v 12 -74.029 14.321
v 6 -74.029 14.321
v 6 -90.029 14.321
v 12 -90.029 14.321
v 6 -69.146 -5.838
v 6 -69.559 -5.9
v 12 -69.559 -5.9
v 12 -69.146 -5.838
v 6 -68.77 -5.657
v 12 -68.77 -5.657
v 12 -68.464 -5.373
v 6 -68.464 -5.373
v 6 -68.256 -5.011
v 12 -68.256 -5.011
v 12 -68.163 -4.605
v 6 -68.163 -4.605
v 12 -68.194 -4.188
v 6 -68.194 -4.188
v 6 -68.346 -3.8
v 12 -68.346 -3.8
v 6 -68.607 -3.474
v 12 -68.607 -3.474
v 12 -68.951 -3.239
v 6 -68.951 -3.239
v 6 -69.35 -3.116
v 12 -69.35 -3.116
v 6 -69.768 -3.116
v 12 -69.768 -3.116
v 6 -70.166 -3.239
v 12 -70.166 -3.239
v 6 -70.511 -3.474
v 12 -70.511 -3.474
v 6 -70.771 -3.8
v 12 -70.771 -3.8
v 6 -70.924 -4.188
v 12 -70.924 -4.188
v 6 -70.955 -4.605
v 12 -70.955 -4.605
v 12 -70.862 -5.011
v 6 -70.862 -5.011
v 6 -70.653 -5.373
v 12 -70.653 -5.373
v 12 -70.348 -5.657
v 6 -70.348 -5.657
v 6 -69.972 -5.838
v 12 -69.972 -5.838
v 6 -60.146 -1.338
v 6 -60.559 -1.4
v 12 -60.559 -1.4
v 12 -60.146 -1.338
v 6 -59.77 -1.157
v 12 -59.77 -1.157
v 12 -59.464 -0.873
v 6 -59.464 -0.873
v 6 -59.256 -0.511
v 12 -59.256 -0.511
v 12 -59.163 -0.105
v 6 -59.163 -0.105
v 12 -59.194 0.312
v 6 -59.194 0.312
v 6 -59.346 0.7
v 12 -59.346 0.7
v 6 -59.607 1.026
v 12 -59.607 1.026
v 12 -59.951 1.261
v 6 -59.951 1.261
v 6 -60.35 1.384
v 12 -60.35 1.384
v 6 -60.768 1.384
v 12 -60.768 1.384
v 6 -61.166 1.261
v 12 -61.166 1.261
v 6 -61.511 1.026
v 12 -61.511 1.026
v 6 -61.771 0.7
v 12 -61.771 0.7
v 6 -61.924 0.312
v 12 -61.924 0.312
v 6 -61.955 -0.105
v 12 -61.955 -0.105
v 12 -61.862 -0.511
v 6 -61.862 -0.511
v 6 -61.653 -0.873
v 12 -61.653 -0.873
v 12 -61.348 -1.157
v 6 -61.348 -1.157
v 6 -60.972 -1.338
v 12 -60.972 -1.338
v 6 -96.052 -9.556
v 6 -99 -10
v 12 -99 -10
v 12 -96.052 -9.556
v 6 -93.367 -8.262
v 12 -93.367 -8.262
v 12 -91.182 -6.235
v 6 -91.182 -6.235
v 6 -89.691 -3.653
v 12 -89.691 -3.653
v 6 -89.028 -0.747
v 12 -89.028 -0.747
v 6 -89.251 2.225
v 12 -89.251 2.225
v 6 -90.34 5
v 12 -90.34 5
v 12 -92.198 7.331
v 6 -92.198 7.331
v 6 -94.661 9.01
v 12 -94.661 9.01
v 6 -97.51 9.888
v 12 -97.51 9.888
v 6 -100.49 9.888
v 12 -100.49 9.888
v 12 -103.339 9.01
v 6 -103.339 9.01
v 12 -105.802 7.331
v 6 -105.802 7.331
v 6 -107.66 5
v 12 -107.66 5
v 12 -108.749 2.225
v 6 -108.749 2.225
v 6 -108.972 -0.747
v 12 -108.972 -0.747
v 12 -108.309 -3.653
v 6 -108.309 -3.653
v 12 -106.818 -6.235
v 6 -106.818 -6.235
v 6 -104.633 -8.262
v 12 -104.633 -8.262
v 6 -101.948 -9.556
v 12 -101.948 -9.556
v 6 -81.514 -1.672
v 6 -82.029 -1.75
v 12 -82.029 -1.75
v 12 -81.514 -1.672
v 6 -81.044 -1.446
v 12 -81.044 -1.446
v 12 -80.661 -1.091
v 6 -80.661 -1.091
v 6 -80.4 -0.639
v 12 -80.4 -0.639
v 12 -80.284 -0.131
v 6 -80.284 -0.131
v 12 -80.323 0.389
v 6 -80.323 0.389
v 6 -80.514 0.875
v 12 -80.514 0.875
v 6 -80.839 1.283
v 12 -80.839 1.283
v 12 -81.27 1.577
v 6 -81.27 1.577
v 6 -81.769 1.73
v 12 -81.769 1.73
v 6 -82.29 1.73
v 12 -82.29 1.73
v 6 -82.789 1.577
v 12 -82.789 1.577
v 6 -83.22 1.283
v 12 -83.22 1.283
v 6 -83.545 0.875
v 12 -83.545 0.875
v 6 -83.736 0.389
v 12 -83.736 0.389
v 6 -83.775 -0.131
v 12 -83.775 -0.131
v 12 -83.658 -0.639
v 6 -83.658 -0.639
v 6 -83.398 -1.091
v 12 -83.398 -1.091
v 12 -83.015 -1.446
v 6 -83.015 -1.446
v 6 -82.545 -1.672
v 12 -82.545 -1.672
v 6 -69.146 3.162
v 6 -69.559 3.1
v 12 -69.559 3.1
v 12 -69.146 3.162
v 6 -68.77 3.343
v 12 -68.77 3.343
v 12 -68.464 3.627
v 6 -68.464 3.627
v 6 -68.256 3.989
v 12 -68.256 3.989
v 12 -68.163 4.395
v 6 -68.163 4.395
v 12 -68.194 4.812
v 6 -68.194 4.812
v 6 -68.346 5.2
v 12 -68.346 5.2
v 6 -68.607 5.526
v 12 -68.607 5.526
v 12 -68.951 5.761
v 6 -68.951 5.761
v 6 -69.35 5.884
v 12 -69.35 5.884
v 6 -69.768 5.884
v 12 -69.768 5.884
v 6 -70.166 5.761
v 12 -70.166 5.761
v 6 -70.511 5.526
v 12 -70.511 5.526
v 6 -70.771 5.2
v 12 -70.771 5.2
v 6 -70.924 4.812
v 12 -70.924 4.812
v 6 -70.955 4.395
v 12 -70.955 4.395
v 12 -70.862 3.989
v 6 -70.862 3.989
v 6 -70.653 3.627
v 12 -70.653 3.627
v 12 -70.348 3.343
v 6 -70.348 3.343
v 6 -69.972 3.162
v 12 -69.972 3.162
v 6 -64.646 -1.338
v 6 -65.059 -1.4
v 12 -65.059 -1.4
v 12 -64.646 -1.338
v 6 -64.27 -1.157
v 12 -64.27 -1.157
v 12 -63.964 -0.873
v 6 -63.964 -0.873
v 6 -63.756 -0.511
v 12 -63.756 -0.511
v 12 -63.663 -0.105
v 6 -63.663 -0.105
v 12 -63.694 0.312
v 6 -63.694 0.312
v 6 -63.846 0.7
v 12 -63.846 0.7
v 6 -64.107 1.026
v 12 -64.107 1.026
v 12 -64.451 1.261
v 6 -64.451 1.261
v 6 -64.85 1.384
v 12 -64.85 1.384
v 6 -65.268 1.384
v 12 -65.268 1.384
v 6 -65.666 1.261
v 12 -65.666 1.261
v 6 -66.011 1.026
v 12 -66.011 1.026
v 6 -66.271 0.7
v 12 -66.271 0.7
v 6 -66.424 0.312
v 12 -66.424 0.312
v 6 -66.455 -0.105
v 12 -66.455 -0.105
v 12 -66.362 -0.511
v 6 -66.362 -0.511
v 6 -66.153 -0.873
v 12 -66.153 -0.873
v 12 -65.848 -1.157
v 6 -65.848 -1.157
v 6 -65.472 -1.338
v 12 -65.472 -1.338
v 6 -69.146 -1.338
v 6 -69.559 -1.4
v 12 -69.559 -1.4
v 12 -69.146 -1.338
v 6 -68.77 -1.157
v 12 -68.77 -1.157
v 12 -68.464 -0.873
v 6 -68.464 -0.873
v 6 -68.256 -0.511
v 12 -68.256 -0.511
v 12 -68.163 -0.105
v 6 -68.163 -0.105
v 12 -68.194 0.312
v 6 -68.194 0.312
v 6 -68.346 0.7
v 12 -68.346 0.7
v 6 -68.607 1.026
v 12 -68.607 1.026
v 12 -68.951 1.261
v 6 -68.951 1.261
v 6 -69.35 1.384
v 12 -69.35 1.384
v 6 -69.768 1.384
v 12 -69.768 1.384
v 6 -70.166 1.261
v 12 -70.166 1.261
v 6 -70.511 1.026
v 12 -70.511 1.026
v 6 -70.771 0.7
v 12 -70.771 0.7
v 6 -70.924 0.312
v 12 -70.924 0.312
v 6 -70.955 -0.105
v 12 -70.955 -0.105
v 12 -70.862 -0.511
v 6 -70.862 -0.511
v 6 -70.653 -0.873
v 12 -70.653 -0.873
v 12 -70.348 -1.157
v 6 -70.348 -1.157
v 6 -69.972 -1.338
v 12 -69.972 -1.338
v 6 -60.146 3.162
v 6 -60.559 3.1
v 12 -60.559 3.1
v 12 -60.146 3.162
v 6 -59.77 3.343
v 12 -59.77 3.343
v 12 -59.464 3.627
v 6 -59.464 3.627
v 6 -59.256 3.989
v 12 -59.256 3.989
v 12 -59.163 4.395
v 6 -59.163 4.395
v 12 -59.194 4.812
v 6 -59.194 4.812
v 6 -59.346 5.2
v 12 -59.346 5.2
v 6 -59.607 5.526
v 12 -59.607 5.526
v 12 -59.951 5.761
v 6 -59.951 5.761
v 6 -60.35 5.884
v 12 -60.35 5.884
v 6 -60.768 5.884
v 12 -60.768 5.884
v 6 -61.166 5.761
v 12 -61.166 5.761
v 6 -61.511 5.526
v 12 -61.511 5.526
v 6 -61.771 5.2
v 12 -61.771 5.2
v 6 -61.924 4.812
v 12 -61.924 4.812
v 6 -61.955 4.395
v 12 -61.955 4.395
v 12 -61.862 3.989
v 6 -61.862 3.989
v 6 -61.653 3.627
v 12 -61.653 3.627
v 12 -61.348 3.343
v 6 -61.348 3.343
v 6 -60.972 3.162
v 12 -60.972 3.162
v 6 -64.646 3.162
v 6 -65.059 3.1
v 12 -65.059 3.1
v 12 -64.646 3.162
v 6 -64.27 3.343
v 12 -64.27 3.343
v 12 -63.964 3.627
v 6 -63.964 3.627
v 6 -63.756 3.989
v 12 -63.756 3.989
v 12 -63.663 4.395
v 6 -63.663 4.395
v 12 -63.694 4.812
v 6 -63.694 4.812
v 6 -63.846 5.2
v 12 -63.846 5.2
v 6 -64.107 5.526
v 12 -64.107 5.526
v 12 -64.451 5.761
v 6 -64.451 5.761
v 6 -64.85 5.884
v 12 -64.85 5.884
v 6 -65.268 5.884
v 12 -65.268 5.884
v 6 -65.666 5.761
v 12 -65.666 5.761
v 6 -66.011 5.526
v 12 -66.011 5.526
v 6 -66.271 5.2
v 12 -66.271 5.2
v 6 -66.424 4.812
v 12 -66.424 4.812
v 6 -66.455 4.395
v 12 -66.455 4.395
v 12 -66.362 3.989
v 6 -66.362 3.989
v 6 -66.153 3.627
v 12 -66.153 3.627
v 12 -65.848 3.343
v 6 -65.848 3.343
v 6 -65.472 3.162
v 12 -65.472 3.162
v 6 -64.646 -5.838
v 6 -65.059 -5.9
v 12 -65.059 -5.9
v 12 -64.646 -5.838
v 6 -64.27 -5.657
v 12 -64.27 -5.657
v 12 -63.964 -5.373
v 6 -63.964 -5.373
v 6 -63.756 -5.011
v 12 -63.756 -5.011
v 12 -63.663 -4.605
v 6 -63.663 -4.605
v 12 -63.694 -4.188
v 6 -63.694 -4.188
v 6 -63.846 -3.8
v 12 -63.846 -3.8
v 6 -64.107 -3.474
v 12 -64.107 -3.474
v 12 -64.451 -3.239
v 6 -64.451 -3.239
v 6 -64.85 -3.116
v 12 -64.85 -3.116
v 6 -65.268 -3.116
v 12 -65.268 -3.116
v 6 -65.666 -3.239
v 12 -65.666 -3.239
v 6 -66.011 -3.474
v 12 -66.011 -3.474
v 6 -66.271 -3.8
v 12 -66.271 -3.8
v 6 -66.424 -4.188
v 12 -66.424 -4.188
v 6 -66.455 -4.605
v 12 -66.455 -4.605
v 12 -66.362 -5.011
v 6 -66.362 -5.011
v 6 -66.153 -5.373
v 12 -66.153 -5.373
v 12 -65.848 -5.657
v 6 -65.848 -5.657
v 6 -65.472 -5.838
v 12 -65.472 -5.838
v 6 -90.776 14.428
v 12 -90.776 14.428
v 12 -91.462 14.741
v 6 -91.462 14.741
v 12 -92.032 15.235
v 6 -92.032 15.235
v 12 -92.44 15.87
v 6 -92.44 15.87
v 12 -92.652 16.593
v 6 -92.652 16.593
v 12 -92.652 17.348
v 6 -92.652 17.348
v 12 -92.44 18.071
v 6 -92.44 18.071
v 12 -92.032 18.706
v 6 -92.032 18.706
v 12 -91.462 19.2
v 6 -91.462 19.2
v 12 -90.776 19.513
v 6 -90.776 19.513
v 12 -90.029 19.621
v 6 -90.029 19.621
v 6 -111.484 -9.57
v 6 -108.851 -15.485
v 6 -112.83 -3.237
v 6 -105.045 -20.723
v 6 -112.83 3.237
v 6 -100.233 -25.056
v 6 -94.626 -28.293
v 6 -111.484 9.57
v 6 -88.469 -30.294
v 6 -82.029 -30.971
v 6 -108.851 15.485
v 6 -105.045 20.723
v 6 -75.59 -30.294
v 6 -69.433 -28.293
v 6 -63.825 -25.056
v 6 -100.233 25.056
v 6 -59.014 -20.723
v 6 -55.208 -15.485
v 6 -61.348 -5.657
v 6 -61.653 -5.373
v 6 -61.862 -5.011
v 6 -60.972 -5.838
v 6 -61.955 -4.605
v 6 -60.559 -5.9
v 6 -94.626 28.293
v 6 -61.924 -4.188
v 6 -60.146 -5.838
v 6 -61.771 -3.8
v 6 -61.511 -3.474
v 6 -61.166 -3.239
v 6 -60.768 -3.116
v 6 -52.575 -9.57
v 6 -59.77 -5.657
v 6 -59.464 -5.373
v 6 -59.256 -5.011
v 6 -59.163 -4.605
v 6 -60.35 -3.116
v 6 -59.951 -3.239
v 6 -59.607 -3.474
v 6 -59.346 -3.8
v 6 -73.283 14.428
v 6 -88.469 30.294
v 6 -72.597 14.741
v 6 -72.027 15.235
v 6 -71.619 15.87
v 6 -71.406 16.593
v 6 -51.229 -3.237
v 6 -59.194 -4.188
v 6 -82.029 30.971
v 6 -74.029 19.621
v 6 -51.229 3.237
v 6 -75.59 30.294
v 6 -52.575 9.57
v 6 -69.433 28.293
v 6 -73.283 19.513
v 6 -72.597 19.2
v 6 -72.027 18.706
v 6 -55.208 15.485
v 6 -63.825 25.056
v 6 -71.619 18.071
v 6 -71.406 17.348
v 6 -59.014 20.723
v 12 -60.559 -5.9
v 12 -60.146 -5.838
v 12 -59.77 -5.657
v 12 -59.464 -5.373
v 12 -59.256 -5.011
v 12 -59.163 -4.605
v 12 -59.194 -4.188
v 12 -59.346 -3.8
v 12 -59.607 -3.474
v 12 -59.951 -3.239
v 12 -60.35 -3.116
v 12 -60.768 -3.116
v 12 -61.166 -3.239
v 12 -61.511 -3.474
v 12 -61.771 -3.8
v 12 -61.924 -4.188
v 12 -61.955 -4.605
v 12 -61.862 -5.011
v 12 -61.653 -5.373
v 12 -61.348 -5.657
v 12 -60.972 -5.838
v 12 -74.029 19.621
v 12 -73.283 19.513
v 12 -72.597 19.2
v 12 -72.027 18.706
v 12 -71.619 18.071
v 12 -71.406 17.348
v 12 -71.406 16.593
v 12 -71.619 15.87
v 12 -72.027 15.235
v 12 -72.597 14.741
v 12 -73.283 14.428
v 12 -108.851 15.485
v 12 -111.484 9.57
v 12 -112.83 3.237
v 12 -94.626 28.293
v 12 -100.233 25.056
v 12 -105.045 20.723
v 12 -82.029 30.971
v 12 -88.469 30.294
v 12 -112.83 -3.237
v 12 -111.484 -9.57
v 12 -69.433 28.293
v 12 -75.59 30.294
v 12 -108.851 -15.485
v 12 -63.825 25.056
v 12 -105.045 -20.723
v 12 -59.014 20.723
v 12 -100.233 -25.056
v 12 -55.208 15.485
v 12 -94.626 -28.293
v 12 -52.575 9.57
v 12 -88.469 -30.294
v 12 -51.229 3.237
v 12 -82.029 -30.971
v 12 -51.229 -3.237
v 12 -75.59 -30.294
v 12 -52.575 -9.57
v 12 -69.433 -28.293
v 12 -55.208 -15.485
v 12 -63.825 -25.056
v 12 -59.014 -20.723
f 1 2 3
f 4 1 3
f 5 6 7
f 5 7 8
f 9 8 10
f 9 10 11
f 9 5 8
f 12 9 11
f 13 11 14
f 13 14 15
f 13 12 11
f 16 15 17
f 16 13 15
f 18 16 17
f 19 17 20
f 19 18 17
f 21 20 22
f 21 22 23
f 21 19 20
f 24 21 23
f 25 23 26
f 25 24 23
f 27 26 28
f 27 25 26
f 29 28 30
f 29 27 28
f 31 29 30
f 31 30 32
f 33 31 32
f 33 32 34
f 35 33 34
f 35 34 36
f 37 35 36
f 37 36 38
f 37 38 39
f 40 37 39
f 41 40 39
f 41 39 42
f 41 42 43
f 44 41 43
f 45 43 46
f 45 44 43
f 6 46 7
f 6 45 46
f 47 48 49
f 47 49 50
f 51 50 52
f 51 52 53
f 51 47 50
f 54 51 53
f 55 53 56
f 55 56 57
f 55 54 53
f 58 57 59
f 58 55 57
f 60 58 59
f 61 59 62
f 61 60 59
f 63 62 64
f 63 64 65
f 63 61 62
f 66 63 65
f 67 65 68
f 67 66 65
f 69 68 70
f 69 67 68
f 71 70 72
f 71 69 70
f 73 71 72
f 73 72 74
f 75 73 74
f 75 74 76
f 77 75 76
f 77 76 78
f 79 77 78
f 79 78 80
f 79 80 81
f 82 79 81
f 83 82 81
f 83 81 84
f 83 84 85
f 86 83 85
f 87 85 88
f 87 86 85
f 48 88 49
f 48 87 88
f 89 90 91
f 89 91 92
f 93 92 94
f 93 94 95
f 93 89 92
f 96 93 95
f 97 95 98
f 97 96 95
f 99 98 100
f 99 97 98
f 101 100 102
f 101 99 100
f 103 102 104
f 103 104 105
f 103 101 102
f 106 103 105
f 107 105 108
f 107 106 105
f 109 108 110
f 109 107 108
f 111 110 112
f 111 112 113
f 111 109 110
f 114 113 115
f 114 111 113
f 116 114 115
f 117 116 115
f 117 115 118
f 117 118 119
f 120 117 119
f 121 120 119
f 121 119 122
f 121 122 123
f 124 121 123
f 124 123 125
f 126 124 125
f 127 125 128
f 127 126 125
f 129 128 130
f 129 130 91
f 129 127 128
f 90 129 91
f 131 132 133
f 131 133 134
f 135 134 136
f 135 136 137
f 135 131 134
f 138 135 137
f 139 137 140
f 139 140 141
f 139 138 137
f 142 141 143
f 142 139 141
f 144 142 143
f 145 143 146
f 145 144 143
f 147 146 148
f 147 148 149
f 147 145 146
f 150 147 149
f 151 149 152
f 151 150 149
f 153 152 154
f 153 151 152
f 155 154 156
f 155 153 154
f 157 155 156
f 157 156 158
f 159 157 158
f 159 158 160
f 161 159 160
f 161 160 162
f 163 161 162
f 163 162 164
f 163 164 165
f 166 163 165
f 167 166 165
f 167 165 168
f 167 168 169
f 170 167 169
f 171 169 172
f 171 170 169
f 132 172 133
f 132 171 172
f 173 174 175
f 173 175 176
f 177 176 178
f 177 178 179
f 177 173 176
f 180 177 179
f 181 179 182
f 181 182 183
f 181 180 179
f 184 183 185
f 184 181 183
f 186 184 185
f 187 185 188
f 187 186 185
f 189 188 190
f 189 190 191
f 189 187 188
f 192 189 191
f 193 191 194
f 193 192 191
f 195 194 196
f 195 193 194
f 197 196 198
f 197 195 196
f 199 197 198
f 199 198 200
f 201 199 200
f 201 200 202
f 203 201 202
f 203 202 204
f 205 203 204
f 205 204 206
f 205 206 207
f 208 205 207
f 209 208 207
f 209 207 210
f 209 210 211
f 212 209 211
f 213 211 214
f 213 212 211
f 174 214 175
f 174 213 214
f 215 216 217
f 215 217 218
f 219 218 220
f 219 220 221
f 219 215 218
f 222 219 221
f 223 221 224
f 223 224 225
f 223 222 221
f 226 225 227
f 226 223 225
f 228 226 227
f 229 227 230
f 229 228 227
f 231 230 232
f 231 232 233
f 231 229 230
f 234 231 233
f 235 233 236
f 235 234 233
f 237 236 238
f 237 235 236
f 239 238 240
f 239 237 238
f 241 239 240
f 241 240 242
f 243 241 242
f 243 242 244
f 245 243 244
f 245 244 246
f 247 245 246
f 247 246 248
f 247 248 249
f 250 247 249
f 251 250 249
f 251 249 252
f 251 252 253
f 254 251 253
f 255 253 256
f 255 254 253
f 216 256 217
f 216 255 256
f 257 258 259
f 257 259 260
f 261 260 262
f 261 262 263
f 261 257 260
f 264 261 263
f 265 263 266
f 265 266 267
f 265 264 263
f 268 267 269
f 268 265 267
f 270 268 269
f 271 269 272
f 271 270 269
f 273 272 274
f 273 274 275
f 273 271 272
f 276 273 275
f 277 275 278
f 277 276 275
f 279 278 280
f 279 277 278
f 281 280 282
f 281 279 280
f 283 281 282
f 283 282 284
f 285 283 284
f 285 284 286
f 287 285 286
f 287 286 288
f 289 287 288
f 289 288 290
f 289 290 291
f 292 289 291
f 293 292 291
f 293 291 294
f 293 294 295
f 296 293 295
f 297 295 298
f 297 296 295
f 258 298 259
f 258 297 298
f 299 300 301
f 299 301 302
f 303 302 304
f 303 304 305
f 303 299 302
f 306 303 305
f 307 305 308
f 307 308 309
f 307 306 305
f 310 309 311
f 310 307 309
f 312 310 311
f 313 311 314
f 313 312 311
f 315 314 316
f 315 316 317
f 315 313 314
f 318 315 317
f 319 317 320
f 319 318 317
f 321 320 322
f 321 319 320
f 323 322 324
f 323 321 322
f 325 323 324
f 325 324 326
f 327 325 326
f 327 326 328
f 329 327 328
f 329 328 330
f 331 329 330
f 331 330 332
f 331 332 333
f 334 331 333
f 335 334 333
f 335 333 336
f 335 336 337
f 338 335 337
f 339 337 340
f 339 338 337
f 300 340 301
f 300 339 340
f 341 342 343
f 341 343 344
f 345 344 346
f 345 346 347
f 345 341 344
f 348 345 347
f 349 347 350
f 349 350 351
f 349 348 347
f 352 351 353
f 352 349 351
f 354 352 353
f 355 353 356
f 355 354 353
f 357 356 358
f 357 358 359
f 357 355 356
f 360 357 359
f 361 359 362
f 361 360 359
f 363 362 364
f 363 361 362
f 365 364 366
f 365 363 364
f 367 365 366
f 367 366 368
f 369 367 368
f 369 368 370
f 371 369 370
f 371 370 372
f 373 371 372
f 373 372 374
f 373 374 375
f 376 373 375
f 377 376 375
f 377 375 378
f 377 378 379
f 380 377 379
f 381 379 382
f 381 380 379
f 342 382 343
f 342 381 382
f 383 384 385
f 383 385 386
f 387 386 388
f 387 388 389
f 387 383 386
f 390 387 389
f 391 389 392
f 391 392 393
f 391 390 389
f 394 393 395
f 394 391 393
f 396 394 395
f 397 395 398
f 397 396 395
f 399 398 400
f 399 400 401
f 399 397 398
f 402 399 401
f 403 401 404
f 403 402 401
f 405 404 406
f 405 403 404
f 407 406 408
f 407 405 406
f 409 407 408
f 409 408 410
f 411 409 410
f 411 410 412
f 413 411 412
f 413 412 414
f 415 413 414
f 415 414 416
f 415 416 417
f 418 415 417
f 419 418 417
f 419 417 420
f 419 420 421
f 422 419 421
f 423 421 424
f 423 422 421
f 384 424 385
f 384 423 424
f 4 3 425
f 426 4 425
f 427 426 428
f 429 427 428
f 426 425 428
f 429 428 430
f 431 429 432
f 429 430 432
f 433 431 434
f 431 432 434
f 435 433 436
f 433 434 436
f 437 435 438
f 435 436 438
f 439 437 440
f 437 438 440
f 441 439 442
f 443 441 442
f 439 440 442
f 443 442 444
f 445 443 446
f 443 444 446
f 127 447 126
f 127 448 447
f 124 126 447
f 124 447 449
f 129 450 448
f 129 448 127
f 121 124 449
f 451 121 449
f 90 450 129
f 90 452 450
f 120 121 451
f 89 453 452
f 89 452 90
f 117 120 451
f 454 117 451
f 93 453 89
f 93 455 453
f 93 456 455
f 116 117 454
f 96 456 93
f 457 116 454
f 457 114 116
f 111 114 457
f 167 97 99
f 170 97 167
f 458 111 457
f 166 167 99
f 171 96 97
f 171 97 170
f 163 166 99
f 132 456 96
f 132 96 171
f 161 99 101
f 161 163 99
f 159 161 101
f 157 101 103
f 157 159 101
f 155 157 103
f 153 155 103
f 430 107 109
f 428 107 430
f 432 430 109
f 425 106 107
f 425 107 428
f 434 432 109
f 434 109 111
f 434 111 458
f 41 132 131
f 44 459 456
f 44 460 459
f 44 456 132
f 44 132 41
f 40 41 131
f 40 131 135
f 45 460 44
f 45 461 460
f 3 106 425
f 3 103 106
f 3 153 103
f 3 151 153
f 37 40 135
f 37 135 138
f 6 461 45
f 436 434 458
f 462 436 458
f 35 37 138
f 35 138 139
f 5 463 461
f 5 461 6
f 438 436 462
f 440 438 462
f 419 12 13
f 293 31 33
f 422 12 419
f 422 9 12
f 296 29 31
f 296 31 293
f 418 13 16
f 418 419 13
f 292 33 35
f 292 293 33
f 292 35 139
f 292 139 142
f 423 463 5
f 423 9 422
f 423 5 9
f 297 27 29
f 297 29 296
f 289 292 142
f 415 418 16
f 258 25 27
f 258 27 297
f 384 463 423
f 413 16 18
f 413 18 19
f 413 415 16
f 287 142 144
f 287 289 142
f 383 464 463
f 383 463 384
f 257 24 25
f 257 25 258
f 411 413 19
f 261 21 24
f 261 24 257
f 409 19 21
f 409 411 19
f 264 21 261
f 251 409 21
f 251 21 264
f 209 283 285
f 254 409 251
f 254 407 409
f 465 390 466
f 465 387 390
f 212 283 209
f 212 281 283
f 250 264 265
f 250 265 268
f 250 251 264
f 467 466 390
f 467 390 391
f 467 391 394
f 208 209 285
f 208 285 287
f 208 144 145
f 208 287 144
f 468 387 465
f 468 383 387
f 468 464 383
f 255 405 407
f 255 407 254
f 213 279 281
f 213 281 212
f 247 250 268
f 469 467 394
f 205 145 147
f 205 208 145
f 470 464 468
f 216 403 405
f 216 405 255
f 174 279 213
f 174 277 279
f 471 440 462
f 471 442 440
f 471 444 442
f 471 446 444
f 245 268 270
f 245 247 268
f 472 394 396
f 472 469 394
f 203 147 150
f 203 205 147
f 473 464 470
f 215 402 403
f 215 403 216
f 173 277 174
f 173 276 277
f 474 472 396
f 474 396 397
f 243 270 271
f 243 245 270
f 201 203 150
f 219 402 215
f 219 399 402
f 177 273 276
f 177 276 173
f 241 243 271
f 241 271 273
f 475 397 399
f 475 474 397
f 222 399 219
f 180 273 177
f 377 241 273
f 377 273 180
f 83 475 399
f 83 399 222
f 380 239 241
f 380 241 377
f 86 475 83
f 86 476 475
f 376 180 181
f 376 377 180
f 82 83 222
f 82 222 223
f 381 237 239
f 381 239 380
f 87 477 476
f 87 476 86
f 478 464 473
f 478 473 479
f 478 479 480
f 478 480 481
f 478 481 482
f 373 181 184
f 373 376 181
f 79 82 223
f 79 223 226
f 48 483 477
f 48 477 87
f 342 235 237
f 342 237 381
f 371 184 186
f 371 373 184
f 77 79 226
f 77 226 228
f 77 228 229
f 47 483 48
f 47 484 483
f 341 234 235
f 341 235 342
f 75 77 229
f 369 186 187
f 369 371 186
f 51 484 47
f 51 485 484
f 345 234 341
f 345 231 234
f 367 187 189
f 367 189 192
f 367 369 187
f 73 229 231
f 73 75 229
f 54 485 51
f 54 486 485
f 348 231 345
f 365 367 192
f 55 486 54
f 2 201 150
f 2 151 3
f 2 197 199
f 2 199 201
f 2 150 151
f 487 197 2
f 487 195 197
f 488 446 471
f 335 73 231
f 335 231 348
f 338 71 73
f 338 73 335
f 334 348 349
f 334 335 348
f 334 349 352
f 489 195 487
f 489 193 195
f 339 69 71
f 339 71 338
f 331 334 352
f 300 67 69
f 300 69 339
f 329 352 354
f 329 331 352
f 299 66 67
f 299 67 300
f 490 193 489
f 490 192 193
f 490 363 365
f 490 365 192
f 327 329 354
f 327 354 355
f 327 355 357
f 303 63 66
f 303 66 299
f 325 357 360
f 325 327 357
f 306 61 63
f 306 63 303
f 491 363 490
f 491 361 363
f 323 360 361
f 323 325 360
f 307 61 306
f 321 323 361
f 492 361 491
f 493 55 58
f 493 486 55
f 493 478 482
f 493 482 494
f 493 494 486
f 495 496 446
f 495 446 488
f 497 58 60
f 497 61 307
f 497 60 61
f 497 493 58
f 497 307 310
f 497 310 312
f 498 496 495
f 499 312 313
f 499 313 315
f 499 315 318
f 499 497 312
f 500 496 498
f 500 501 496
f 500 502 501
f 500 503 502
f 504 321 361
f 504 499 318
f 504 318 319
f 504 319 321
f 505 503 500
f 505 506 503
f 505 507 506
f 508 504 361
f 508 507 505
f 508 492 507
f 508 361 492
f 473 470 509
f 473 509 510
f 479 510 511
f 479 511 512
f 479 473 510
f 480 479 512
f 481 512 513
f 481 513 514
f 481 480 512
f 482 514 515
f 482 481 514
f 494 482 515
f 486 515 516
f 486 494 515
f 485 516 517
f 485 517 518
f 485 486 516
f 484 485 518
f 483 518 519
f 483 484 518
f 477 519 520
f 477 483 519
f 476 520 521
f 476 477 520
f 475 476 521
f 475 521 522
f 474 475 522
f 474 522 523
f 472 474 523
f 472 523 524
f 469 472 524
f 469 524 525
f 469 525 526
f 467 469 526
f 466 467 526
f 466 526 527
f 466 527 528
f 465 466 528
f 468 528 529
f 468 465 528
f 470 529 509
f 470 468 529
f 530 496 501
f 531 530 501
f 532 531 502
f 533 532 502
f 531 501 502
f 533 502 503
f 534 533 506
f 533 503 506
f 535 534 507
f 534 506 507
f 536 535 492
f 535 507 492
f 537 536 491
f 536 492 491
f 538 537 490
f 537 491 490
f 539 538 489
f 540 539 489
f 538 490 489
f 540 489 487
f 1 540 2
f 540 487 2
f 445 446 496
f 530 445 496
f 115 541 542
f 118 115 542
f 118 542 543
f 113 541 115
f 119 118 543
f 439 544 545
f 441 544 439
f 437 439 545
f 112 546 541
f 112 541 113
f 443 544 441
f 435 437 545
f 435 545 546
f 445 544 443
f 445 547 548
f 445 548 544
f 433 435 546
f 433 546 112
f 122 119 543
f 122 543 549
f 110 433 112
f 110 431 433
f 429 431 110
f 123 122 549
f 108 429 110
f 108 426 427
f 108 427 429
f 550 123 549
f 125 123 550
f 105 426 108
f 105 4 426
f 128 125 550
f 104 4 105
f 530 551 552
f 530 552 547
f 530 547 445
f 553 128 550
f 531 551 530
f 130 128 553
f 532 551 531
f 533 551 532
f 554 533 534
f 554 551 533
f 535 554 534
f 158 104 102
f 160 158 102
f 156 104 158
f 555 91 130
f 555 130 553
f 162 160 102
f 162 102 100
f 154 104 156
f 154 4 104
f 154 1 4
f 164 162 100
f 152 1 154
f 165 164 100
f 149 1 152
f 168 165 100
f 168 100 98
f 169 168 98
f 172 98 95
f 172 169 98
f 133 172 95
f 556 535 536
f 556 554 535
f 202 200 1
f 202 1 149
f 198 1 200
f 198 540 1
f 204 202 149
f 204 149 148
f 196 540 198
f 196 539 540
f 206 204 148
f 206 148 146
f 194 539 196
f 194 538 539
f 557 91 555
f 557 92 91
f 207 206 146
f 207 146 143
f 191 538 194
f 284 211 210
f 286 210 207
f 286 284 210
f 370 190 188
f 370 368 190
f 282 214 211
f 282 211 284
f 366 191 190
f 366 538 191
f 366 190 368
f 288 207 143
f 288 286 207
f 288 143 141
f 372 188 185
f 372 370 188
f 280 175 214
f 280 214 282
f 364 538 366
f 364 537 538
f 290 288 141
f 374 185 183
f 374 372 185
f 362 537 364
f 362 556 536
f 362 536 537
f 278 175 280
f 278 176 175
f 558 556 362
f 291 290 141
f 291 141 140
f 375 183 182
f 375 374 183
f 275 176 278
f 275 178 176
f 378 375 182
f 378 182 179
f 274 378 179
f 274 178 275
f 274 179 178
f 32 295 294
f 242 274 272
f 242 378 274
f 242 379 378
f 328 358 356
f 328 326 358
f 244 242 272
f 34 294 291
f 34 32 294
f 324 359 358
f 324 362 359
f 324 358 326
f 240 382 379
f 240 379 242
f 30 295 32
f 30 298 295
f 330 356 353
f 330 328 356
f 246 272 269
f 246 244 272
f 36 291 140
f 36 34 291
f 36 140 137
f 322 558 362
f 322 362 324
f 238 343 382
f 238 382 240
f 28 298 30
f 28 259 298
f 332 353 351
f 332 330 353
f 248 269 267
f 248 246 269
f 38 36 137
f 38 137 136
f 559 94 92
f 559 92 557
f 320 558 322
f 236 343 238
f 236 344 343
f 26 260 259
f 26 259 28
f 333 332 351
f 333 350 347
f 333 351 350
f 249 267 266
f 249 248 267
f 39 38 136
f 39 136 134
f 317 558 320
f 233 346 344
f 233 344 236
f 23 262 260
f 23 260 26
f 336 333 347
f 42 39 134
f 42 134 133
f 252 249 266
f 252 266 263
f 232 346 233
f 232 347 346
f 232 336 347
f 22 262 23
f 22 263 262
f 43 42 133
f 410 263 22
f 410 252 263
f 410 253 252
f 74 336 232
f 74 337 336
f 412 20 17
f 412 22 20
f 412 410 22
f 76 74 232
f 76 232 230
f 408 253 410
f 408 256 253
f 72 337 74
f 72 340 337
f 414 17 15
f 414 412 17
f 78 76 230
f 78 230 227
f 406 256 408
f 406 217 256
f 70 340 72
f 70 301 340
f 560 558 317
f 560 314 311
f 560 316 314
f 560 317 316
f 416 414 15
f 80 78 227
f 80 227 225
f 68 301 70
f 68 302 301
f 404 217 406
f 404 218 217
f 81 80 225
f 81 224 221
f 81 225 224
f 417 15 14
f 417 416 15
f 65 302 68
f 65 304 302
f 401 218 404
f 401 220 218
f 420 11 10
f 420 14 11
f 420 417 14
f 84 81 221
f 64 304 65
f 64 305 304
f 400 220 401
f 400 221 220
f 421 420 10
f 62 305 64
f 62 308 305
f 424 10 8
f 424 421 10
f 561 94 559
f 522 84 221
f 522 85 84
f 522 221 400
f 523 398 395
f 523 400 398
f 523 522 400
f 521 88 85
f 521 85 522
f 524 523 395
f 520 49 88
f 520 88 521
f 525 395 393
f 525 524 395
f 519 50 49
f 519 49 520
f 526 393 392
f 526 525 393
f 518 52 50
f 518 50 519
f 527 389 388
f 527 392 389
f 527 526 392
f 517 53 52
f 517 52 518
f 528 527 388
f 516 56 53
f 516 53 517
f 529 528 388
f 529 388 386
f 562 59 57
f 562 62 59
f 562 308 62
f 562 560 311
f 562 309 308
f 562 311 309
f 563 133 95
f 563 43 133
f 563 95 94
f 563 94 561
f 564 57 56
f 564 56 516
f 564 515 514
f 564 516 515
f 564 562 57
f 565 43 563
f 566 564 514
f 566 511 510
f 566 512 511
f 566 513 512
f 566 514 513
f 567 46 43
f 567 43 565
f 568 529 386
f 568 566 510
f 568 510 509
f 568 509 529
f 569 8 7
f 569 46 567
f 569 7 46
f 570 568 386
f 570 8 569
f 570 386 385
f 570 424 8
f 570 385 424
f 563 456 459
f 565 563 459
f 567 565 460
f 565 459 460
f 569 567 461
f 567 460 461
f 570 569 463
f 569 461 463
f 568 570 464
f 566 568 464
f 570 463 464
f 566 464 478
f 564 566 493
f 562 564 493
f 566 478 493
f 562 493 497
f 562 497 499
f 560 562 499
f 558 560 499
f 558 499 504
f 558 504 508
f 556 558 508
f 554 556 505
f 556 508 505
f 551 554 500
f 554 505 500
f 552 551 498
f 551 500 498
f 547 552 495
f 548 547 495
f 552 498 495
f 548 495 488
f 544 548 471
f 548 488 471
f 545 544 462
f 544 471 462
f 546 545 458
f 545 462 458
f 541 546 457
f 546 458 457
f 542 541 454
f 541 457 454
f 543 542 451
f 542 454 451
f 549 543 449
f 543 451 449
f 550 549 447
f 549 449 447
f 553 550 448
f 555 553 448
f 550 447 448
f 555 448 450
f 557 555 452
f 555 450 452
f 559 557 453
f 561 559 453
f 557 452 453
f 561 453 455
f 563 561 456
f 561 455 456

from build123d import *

# Parameters (mm, degrees)
SKETCH1_W           = 112.5
SKETCH1_H           = 238
BOSS_EXTRUDE1_DEPTH = 6
SKETCH2_R           = 30.970562748
SKETCH2_R_2         = 10
SKETCH2_R_3         = 1.4
SKETCH2_R_4         = 1.75
BOSS_EXTRUDE2_DEPTH = 6
SKETCH3_W           = 112.5
SKETCH3_H           = 238
CUT_EXTRUDE1_DEPTH  = 6


with BuildPart() as part:
    # Sketch1 → Boss-Extrude1 (new body)
    with BuildSketch(Plane(origin=(0, 0, 0), x_dir=(0, 0, -1), z_dir=(1, 0, 0))):
        Rectangle(SKETCH1_W, SKETCH1_H)
    extrude(amount=BOSS_EXTRUDE1_DEPTH)

    # Sketch2 → Boss-Extrude2 (add)
    with BuildSketch(Plane(origin=(6, 0, 0), x_dir=(0, 0, -1), z_dir=(1, 0, 0))):
        with Locations((0, -82.029437252)):
            Circle(SKETCH2_R)
        with Locations((0, -99)):
            Circle(SKETCH2_R_2, mode=Mode.SUBTRACT)
        with Locations((-4.5, -60.558874503)):
            Circle(SKETCH2_R_3, mode=Mode.SUBTRACT)
        with Locations((0, -60.558874503)):
            Circle(SKETCH2_R_3, mode=Mode.SUBTRACT)
        with Locations((4.5, -60.558874503)):
            Circle(SKETCH2_R_3, mode=Mode.SUBTRACT)
        with Locations((0, -65.058874503)):
            Circle(SKETCH2_R_3, mode=Mode.SUBTRACT)
        with Locations((4.5, -65.058874503)):
            Circle(SKETCH2_R_3, mode=Mode.SUBTRACT)
        with Locations((0, -69.558874503)):
            Circle(SKETCH2_R_3, mode=Mode.SUBTRACT)
        with Locations((4.5, -69.558874503)):
            Circle(SKETCH2_R_3, mode=Mode.SUBTRACT)
        with Locations((-4.5, -65.058874503)):
            Circle(SKETCH2_R_3, mode=Mode.SUBTRACT)
        with Locations((-4.5, -69.558874503)):
            Circle(SKETCH2_R_3, mode=Mode.SUBTRACT)
        with Locations((0, -82.029437252)):
            Circle(SKETCH2_R_4, mode=Mode.SUBTRACT)
        with BuildLine():
            Line((-14.320562748, -74.029437252), (-14.320562748, -90.029437252))
            ThreePointArc((-14.320562748, -90.029437252), (-16.970562748, -92.679437252), (-19.620562748, -90.029437252))
            Line((-19.620562748, -90.029437252), (-19.620562748, -74.029437252))
            ThreePointArc((-19.620562748, -74.029437252), (-16.970562748, -71.379437252), (-14.320562748, -74.029437252))
        make_face(mode=Mode.SUBTRACT)
    extrude(amount=BOSS_EXTRUDE2_DEPTH)

    # Sketch3 → Cut-Extrude1 (cut)
    with BuildSketch(Plane.ZY):
        Rectangle(SKETCH3_W, SKETCH3_H)
    extrude(amount=-CUT_EXTRUDE1_DEPTH, mode=Mode.SUBTRACT)


solid = part.part
